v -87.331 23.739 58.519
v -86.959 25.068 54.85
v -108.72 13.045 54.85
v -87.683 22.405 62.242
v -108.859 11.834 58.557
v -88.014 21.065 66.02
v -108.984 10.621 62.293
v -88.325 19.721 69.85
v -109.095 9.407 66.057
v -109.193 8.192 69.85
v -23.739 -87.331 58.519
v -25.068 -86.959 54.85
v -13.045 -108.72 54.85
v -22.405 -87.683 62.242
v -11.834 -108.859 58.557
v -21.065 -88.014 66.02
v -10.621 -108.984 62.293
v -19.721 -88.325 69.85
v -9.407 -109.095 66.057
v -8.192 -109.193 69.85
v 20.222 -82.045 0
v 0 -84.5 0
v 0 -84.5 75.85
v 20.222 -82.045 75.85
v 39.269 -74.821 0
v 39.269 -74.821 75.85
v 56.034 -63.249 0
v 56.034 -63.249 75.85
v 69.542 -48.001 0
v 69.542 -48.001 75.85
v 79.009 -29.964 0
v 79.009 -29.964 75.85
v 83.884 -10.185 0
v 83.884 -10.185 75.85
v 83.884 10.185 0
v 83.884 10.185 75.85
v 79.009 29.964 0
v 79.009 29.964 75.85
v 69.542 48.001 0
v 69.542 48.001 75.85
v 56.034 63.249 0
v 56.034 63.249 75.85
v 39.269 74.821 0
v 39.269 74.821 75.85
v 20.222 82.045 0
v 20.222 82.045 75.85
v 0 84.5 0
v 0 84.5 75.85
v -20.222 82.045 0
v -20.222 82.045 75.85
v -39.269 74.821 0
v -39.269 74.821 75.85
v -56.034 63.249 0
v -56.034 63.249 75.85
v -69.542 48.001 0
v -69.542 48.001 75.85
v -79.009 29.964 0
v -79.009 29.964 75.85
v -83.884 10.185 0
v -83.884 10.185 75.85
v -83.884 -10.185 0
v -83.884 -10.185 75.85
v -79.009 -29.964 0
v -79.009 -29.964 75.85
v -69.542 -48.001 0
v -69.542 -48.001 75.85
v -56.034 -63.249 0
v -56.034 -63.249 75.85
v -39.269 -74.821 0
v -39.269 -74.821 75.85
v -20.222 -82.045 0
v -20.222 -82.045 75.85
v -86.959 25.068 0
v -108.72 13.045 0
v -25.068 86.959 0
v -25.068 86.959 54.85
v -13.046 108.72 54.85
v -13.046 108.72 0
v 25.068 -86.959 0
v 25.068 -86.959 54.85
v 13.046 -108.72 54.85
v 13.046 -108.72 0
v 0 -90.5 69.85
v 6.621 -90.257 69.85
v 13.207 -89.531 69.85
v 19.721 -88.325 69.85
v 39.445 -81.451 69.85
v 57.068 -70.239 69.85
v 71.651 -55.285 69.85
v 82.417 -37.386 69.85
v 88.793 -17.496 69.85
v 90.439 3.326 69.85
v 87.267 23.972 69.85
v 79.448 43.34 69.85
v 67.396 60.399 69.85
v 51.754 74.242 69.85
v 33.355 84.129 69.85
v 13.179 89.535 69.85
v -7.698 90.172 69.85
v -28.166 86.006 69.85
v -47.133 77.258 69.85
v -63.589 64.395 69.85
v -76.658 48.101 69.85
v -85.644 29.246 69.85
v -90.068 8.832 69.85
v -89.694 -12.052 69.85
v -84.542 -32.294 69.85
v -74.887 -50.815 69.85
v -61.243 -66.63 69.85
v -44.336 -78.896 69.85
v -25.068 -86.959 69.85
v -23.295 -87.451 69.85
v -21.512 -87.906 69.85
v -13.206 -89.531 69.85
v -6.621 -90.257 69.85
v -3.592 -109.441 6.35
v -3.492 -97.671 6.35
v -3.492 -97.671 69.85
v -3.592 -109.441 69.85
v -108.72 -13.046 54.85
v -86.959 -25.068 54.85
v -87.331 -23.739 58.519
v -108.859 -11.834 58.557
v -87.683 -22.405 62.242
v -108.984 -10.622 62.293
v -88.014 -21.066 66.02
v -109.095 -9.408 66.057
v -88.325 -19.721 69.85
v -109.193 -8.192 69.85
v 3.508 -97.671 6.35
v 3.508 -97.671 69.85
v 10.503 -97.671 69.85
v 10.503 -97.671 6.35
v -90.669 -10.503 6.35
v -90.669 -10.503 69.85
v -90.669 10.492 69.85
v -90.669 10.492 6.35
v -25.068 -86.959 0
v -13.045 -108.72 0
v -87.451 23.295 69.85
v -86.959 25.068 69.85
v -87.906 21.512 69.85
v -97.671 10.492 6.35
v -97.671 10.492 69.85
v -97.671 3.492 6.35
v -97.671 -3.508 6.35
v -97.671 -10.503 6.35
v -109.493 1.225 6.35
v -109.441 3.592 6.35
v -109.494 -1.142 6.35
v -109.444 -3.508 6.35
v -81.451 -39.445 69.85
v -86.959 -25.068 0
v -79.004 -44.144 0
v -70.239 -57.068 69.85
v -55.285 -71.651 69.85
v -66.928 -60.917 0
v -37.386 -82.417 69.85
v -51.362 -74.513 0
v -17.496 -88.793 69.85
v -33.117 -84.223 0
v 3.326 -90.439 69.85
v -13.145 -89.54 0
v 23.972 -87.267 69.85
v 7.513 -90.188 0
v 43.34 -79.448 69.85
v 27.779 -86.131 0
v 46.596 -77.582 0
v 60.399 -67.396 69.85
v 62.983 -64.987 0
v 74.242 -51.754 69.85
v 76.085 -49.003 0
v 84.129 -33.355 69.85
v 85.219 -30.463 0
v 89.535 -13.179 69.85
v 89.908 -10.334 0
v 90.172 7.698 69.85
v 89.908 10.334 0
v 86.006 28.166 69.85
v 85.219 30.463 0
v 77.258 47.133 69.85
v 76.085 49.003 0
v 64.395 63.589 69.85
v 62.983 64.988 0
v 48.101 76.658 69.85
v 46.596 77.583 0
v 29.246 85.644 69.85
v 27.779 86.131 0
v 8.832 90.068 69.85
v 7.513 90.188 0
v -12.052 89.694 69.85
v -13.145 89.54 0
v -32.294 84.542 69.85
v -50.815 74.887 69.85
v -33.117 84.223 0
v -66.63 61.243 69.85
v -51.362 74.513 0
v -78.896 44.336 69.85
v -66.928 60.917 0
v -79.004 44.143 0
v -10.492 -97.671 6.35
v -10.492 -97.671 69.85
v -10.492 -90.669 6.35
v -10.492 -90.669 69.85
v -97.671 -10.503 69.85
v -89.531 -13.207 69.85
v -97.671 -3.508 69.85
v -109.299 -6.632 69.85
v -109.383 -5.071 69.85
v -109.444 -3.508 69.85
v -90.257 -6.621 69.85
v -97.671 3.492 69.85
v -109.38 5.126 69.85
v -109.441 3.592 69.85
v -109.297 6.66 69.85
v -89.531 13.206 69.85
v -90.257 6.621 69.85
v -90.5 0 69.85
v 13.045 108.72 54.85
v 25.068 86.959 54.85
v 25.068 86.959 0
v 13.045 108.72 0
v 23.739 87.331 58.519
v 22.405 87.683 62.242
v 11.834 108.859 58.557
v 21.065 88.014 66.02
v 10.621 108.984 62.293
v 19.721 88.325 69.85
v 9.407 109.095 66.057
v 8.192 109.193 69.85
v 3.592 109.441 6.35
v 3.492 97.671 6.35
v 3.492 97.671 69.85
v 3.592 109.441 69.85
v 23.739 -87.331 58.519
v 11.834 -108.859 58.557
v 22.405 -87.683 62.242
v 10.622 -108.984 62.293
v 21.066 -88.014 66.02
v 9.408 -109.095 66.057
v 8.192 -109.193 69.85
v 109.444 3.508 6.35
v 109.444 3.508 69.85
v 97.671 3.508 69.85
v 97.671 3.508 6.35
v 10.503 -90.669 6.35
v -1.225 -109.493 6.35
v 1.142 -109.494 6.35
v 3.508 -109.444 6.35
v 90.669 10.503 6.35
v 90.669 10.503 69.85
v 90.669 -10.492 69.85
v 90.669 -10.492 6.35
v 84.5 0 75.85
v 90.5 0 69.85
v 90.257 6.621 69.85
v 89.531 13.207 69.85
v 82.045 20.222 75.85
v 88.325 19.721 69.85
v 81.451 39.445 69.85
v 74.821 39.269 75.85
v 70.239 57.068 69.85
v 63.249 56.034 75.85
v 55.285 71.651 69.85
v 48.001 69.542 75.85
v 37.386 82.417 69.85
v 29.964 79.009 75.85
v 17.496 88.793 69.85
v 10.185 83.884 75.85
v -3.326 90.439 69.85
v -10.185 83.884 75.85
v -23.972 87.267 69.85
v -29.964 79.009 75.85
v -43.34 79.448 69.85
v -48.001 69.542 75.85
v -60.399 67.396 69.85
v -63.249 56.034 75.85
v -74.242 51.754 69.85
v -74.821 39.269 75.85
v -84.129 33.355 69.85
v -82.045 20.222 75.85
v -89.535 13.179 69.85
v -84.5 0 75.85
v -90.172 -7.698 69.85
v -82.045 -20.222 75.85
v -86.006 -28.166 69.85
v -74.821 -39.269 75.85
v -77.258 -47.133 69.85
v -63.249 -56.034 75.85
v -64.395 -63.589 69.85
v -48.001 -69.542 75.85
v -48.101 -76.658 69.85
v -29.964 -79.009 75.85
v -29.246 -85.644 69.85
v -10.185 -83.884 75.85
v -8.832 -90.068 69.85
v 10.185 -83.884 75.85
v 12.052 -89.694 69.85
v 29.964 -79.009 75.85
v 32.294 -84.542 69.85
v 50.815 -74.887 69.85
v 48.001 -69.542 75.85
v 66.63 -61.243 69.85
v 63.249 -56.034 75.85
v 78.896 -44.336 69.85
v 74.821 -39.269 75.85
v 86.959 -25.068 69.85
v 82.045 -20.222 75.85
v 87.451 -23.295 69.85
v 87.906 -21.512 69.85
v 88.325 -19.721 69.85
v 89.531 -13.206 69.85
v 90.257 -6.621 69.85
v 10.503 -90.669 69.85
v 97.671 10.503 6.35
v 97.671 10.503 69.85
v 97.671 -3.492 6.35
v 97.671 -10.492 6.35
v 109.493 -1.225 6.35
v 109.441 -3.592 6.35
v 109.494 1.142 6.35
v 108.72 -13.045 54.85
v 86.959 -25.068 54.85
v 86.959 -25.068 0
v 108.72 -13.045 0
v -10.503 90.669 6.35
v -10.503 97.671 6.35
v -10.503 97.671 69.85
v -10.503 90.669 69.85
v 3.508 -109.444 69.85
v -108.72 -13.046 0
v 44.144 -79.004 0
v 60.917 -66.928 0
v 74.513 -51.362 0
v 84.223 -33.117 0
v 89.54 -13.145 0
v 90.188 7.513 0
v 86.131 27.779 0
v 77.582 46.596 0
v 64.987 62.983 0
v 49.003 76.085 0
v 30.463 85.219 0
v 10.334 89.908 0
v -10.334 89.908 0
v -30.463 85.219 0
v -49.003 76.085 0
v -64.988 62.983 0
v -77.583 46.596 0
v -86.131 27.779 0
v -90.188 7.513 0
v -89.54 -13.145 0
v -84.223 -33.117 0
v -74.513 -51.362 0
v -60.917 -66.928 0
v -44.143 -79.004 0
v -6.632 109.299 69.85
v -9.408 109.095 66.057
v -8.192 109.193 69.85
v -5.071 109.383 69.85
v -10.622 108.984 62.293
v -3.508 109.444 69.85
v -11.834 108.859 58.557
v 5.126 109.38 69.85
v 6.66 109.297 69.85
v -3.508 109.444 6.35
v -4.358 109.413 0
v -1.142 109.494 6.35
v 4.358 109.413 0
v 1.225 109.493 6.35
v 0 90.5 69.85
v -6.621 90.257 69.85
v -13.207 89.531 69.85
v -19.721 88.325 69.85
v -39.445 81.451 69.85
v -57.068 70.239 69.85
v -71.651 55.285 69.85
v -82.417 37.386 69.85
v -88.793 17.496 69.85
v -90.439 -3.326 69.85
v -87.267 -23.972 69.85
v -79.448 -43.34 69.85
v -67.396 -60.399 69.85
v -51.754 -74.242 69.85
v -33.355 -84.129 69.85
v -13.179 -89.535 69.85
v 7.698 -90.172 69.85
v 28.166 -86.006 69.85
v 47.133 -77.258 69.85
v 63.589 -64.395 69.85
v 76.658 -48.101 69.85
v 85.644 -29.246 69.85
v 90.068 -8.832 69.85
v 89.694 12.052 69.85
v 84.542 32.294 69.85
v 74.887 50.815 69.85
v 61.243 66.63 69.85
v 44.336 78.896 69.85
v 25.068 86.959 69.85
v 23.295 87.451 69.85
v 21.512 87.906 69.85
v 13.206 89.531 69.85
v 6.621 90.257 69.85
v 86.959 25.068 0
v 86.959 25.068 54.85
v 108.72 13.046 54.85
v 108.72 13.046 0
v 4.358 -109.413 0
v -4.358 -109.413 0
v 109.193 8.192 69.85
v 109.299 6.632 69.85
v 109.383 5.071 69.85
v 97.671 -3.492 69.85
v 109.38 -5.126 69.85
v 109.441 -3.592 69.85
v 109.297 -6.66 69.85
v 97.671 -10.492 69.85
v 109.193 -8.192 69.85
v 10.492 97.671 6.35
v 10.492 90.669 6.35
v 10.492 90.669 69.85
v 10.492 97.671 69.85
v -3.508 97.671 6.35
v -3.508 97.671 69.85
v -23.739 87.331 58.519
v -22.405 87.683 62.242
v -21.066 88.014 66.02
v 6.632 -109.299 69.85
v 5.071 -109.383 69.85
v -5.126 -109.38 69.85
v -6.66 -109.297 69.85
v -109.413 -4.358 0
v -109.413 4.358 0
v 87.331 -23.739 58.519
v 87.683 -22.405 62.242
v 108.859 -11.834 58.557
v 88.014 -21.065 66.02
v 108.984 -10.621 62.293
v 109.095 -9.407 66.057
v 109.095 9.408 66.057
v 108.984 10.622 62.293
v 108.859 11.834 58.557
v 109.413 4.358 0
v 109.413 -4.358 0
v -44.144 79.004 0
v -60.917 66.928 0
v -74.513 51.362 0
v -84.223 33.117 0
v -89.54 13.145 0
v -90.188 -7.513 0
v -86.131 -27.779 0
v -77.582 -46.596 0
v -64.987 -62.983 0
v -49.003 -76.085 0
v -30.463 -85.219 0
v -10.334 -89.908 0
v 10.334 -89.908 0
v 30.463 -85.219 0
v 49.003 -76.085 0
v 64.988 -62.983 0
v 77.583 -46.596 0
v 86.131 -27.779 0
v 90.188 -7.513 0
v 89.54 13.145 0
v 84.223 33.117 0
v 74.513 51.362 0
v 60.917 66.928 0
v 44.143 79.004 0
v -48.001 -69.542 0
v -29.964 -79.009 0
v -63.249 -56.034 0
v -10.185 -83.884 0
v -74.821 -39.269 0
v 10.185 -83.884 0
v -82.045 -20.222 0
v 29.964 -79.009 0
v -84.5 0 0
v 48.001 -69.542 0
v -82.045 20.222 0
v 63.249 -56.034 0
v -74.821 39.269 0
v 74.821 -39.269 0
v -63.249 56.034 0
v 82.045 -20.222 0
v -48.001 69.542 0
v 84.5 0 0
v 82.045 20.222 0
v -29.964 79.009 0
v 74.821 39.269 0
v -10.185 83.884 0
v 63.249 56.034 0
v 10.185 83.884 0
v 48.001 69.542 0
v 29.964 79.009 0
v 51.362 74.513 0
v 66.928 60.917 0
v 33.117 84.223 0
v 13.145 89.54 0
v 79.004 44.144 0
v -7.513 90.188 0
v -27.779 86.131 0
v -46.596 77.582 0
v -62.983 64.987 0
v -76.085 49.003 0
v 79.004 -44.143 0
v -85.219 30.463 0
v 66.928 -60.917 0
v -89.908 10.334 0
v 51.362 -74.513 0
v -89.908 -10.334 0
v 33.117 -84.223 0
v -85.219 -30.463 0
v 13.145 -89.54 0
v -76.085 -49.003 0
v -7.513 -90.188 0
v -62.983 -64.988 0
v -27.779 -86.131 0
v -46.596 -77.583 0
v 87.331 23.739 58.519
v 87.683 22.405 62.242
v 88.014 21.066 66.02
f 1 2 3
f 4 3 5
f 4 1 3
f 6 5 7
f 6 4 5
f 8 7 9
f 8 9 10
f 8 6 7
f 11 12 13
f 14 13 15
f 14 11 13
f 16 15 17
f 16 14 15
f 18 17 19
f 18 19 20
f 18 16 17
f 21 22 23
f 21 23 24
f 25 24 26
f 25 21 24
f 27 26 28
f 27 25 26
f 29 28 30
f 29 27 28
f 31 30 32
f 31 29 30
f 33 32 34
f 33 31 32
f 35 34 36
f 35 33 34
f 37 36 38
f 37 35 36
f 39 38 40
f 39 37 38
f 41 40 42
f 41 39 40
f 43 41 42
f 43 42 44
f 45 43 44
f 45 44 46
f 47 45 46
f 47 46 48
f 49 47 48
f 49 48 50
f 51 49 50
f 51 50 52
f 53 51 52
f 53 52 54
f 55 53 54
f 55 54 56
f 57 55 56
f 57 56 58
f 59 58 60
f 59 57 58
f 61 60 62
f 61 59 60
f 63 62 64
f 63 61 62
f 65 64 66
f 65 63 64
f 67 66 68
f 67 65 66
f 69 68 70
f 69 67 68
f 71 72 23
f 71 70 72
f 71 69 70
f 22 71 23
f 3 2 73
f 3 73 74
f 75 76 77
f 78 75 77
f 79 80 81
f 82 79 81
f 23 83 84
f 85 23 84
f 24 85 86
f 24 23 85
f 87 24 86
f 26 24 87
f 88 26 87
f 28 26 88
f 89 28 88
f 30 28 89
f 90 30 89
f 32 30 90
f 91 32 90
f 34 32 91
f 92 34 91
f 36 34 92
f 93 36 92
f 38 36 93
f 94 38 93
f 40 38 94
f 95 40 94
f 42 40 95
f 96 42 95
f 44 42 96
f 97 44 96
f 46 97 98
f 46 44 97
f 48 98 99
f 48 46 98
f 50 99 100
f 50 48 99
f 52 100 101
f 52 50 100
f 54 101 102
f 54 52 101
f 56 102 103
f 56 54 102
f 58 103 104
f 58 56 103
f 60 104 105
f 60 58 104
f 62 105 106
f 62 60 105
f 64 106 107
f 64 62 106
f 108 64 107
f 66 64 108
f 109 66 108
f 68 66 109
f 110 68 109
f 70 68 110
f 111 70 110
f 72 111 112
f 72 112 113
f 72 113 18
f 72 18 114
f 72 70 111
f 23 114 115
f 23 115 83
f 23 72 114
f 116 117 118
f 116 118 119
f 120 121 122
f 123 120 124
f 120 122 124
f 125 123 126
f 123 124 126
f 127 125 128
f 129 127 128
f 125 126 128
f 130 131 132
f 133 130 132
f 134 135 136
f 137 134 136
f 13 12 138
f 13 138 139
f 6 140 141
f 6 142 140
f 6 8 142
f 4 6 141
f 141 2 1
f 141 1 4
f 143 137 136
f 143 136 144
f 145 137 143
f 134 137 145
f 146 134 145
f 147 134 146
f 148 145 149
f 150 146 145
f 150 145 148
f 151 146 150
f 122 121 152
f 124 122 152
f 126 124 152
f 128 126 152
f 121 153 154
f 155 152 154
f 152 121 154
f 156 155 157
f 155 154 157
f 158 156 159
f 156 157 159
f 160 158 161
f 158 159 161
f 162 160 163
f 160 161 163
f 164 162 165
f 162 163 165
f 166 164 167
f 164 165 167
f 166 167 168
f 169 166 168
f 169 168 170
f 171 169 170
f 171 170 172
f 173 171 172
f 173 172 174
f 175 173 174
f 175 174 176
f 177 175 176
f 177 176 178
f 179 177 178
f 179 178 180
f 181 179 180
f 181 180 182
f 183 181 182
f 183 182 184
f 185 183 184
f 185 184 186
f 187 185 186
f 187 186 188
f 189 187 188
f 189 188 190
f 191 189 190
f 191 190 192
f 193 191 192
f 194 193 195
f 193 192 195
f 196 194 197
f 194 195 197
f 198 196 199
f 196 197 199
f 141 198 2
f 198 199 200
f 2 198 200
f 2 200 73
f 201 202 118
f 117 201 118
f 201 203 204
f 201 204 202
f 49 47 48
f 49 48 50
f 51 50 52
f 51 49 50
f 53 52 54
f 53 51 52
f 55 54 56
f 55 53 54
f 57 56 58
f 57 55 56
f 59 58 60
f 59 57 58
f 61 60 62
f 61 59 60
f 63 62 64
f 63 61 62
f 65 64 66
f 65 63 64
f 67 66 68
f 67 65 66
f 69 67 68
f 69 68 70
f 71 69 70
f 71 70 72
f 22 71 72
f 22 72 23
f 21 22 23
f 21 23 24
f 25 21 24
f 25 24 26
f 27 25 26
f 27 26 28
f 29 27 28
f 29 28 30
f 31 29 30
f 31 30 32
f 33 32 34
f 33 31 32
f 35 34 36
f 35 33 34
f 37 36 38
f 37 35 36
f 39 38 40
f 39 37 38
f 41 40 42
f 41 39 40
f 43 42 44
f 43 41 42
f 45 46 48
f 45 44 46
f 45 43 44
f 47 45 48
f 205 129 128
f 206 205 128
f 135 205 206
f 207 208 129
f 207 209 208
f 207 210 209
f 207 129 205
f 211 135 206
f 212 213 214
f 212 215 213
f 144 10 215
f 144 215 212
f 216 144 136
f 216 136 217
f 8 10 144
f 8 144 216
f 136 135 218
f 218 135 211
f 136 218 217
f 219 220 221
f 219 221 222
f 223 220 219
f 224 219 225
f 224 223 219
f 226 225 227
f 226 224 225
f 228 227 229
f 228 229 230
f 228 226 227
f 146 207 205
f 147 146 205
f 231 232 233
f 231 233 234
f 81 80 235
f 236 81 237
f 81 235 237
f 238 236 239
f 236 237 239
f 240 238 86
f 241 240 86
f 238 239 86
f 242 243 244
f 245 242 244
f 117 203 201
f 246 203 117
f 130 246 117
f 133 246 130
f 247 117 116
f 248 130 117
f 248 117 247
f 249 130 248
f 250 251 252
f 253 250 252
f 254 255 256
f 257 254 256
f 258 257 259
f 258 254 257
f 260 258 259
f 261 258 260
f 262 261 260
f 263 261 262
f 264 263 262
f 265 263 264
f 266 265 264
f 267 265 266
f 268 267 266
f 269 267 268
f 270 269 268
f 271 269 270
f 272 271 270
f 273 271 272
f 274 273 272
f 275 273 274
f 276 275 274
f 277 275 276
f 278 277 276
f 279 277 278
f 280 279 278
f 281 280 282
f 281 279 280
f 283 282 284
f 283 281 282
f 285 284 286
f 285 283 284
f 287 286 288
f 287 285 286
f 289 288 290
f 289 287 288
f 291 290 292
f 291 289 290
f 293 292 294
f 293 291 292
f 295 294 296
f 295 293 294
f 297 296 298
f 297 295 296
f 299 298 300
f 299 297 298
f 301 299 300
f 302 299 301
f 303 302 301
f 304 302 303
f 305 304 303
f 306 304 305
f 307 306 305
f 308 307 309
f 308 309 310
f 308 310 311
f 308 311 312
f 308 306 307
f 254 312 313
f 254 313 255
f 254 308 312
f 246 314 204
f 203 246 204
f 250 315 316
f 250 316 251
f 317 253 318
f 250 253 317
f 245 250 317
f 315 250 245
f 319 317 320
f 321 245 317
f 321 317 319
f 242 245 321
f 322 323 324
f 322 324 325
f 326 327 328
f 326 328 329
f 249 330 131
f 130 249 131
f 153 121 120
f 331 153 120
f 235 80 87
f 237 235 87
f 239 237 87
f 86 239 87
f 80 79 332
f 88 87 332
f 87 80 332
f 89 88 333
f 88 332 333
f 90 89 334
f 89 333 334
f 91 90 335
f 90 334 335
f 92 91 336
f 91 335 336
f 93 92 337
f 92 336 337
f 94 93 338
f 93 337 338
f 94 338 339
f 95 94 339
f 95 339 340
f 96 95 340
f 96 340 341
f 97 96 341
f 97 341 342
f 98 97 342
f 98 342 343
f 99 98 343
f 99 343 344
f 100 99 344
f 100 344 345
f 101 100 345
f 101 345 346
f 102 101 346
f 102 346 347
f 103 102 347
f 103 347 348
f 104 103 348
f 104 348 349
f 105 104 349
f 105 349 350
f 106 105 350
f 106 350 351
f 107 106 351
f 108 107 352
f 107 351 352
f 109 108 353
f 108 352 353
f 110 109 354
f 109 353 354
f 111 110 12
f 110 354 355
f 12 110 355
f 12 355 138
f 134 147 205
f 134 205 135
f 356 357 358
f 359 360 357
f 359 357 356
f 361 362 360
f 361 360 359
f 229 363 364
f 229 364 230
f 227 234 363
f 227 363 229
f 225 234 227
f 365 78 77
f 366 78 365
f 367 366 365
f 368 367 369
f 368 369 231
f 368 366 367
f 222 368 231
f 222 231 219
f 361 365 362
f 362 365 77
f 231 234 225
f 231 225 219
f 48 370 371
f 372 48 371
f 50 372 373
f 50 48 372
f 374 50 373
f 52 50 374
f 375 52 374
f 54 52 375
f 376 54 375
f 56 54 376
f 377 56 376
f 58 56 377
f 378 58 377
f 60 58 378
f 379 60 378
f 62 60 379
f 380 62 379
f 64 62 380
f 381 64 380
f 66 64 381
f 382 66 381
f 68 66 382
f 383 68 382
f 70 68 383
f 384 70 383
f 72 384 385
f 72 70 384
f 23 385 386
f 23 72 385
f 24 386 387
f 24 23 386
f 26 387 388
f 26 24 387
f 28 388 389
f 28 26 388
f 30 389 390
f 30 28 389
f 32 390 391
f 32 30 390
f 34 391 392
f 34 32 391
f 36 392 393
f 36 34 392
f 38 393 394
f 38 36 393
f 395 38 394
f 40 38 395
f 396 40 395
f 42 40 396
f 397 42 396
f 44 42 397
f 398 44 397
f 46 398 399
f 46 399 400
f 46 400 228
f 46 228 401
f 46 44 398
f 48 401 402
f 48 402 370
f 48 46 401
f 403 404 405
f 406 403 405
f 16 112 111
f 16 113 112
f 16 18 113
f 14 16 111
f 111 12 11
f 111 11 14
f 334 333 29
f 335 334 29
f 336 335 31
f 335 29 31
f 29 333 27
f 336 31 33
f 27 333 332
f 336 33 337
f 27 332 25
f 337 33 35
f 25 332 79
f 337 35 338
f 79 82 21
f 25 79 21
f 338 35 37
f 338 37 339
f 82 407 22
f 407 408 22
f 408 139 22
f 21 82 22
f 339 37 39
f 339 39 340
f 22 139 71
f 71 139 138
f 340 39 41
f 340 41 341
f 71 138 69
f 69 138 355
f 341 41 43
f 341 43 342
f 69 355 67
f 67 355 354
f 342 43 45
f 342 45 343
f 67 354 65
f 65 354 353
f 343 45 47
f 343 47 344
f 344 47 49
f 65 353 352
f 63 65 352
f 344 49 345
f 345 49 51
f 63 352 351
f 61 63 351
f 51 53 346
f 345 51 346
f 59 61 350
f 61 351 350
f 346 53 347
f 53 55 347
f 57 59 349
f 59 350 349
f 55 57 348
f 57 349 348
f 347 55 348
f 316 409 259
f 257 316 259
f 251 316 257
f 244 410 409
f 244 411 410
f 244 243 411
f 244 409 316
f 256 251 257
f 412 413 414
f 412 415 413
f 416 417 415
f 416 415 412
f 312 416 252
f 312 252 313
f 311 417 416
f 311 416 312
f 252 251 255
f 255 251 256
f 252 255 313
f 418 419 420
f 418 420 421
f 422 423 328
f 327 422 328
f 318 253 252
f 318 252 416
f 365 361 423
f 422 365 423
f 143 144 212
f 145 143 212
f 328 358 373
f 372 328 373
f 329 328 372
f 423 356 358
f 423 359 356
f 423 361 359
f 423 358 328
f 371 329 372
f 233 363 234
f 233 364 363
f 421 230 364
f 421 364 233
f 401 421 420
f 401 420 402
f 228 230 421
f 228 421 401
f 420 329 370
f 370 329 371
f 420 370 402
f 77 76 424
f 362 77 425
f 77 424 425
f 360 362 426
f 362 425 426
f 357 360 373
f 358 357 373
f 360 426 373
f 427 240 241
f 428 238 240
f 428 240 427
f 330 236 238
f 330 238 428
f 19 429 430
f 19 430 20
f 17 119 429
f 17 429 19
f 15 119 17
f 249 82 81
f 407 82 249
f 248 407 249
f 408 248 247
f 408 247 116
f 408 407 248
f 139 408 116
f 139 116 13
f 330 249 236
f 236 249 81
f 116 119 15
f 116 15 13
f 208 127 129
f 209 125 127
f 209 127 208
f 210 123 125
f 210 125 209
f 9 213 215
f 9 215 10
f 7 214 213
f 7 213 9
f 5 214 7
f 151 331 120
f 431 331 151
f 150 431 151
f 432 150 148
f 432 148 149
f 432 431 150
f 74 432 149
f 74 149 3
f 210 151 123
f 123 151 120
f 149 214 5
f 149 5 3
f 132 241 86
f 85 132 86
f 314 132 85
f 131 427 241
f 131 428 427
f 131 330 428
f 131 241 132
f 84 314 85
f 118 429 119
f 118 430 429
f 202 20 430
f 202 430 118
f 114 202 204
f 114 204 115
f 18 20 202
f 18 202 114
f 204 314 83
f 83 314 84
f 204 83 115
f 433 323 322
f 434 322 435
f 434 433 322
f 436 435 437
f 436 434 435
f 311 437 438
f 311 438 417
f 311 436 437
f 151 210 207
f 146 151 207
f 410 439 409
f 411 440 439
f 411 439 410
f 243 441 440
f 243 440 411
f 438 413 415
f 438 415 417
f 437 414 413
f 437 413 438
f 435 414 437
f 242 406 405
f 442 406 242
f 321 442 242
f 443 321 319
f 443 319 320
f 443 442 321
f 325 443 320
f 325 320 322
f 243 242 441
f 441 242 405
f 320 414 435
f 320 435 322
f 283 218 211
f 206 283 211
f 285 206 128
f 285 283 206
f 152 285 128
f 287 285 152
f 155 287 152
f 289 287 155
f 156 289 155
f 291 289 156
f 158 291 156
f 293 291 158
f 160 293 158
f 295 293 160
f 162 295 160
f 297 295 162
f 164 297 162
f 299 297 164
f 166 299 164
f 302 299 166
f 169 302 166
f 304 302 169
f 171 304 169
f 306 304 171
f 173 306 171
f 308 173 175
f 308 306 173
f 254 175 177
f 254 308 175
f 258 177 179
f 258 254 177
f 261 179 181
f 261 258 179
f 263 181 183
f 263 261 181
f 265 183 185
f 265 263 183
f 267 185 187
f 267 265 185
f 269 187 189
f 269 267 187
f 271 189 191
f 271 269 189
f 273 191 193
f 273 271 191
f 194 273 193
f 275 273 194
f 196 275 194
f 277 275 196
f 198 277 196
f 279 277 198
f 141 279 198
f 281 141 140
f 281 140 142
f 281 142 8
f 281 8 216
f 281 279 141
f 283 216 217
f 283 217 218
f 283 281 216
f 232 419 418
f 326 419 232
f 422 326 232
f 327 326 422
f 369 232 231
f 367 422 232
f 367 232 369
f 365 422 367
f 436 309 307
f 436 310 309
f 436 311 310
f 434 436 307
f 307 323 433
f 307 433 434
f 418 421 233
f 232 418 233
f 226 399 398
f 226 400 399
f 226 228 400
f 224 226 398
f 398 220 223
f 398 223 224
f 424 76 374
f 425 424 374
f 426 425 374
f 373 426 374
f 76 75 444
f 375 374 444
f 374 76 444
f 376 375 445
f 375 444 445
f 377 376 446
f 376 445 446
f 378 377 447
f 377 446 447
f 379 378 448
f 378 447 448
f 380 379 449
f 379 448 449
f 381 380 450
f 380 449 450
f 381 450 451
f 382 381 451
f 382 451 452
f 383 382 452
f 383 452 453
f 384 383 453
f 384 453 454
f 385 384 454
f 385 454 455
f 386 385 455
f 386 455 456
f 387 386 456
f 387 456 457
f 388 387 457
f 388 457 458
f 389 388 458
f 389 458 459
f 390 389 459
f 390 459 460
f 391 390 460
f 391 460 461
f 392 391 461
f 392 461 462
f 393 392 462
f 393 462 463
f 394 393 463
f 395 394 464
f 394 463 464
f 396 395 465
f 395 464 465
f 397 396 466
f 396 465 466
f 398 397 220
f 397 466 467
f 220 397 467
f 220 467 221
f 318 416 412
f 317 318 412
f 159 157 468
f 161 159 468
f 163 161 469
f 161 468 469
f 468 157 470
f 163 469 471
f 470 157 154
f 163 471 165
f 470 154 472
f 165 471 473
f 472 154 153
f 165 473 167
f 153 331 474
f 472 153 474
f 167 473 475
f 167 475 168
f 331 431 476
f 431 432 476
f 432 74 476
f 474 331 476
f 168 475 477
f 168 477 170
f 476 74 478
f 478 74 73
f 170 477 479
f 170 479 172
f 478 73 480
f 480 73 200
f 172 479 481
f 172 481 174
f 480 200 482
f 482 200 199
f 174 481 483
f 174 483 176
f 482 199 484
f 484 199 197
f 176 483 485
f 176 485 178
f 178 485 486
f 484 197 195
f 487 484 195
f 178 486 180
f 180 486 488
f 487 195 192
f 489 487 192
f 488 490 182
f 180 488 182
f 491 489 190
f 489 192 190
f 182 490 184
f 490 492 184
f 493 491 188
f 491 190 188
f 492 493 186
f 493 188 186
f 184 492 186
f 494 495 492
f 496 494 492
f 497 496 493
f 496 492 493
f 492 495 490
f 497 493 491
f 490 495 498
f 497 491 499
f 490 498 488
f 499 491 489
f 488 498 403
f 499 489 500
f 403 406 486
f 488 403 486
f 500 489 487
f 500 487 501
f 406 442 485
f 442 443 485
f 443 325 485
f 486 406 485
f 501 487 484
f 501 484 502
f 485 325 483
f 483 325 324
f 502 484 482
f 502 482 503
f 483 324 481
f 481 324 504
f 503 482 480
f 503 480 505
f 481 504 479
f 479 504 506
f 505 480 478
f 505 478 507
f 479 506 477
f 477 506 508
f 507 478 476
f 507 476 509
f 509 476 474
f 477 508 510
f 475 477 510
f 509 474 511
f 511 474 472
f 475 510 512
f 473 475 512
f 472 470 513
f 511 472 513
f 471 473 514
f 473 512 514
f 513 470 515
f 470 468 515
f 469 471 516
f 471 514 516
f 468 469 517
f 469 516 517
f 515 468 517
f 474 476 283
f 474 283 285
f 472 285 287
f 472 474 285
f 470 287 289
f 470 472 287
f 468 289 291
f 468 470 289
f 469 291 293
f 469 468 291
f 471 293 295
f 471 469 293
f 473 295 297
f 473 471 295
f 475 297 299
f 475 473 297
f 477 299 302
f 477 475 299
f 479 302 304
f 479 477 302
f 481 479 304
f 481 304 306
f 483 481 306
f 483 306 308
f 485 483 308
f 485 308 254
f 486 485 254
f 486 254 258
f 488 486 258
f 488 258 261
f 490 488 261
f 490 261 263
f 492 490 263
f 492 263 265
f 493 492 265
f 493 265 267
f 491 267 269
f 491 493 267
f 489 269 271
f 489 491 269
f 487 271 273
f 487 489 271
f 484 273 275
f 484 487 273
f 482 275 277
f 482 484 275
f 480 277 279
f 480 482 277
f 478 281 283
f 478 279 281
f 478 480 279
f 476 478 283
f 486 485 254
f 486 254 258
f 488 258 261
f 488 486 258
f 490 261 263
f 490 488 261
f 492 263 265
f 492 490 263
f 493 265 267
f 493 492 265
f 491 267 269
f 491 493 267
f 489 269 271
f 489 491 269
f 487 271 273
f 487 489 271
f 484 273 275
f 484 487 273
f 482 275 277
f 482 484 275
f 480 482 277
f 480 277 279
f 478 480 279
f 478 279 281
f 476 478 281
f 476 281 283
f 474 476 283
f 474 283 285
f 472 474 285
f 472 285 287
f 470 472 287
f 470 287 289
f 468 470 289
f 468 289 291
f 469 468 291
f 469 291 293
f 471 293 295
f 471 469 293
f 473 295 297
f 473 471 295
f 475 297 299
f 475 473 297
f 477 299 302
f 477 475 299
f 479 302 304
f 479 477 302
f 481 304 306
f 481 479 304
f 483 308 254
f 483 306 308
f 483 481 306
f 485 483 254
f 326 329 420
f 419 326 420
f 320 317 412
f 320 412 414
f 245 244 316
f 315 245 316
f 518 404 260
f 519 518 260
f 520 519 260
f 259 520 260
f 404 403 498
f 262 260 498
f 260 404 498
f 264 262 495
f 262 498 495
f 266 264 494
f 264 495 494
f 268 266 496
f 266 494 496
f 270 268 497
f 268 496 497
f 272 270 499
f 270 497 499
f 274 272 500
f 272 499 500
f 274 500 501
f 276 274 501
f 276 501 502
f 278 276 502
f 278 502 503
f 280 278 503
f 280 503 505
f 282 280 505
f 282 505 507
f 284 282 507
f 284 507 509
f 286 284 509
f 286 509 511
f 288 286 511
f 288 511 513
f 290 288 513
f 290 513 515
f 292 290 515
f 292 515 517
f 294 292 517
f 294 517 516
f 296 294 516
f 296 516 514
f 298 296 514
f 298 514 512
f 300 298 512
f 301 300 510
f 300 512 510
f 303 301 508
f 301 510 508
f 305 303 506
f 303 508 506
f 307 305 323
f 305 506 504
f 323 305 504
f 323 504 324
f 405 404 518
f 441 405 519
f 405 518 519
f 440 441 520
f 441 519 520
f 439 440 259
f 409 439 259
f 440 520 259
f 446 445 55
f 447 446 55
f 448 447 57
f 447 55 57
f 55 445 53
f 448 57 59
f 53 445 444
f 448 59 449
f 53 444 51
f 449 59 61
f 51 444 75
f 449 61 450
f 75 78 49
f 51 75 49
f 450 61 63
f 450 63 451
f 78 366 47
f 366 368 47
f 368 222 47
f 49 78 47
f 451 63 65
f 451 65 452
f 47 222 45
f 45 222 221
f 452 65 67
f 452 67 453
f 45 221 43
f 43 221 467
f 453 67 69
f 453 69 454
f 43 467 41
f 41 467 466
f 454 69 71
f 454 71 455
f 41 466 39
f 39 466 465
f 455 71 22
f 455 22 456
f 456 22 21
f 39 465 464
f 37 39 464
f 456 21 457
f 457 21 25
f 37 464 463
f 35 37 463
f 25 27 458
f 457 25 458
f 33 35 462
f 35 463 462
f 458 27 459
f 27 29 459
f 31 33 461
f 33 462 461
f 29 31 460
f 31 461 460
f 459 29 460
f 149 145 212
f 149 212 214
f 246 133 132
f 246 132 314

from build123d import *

# Parameters (mm, degrees)
SKETCH1_R           = 90.5
SKETCH1_R_2         = 84.5
BOSS_EXTRUDE1_DEPTH = 76.35
CHAMFER1_SIZE       = 6.5
WRAP12_SECTION_W    = 19
WRAP12_SECTION_H    = 69.85
WRAP12_ANGLE        = 32.161608832
CUT_EXTRUDE1_DEPTH  = 63.5
CHAMFER2_SIZE       = 19
CHAMFER5_SIZE       = 15
CHAMFER5_SIZE_2     = 4.019237886
CIRPATTERN6_COUNT   = 4


with BuildPart() as part:
    # Sketch1 → Boss-Extrude1 (new body)
    with BuildSketch(Plane.XY):
        Circle(SKETCH1_R)
        Circle(SKETCH1_R_2, mode=Mode.SUBTRACT)
    extrude(amount=BOSS_EXTRUDE1_DEPTH)

    # Chamfer1
    # the kernel refuses this chamfer: 6.5 mm, written as the material it takes off along each edge
    with BuildSketch(Plane(origin=(0, 0, 76.35), x_dir=(1, 0, 0), z_dir=(0, -1, 0))) as chamfer1_piece_1:
        Polygon((90.5, -CHAMFER1_SIZE), (90.5 - CHAMFER1_SIZE, 0), (90.5, 0), align=None)
    revolve(axis=Axis((0, 0, 76.35), (0, 0, 1)), mode=Mode.SUBTRACT)

    # Wrap12 section (on wrap section) → Wrap12 (revolve)
    with BuildSketch(Plane(origin=(0, 0, 0), x_dir=(0.9608717281441653, 0.276993722046629, 0), z_dir=(-0.276993722046629, 0.9608717281441653, 0))):
        with Locations((100, -34.925)):
            Rectangle(WRAP12_SECTION_W, WRAP12_SECTION_H)
    revolve(axis=Axis((0, 0, 0), (0, 0, -1)), revolution_arc=WRAP12_ANGLE)

    # Sketch12 → Cut-Extrude1 (cut)
    with BuildSketch(Plane.XY.offset(69.85)):
        Polygon((122.706651928, -0.201195148), (122.706651928, 3.507927311), (97.67138598, 3.507927311), (97.67138598, 10.503148948), (90.66864355, 10.503148948), (90.66864355, -10.492123054), (97.67138598, -10.492123054), (97.67138598, -3.492123054), (122.706651928, -3.70406248), align=None)
    extrude(amount=-CUT_EXTRUDE1_DEPTH, mode=Mode.SUBTRACT)

    # Chamfer2
    # the kernel refuses this chamfer: 19 mm, written as the material it takes off along each edge
    with BuildSketch(Plane(origin=(105.215515497, -30.330600038, 118.711976771), x_dir=(-0.9608722876451651, 0.27699178116967144, 0), z_dir=(0, 0, -1))) as chamfer2_piece_1_section:
        with BuildLine():
            Line((CHAMFER2_SIZE, 0), (1.420369251, 17.579630749))
            ThreePointArc((1.420369251, 17.579630749), (0.375784571, 9.063973019), (0, 0))
            Line((0, 0), (CHAMFER2_SIZE, 0))
        make_face()
    chamfer2_piece_1 = extrude(amount=167.573953543, mode=Mode.PRIVATE)
    chamfer2_piece_1 = chamfer2_piece_1 - Plane(origin=(0, 0, 118.711976771), x_dir=(1, 0, 0), z_dir=(0, 0, -1)) * Cylinder(90.5, 412, mode=Mode.PRIVATE)
    add(chamfer2_piece_1, mode=Mode.SUBTRACT)
    with BuildSketch(Plane(origin=(105.215454232, 30.330812564, 118.711976771), x_dir=(-0.9608717281441654, -0.2769937220466291, 0), z_dir=(0, 0, -1))) as chamfer2_piece_2_section:
        with BuildLine():
            Line((CHAMFER2_SIZE, 0), (1.420369251, -17.579630749))
            ThreePointArc((1.420369251, -17.579630749), (0.375784571, -9.063973019), (0, 0))
            Line((0, 0), (CHAMFER2_SIZE, 0))
        make_face()
    chamfer2_piece_2 = extrude(amount=167.573953543, mode=Mode.PRIVATE)
    chamfer2_piece_2 = chamfer2_piece_2 - Plane(origin=(0, 0, 118.711976771), x_dir=(1, 0, 0), z_dir=(0, 0, -1)) * Cylinder(90.5, 412, mode=Mode.PRIVATE)
    add(chamfer2_piece_2, mode=Mode.SUBTRACT)

    # Chamfer5
    # the kernel refuses this chamfer: 15, 4.019237886 mm, written as the material it takes off along each edge
    with BuildSketch(Plane(origin=(52.865116584, 43.903567605, 69.85), x_dir=(0, 0, -1), z_dir=(0.8753030540266438, -0.483574775615551, 0))) as chamfer5_piece_1_section:
        Polygon((CHAMFER5_SIZE, 0), (0, -CHAMFER5_SIZE_2), (0, 0), align=None)
    chamfer5_piece_1 = extrude(amount=102.762999332, mode=Mode.PRIVATE)
    chamfer5_piece_1 = chamfer5_piece_1 - Plane(origin=(0, 0, 69.85), x_dir=(1, 0, 0), z_dir=(0, 0, -1)) * Cylinder(90.5, 266, mode=Mode.PRIVATE)
    add(chamfer5_piece_1, mode=Mode.SUBTRACT)
    with BuildSketch(Plane(origin=(52.865205265, -43.903460822, 69.85), x_dir=(0, 0, -1), z_dir=(0.8753020772463168, 0.48357654364979585, 0))) as chamfer5_piece_2_section:
        Polygon((CHAMFER5_SIZE, 0), (0, CHAMFER5_SIZE_2), (0, 0), align=None)
    chamfer5_piece_2 = extrude(amount=102.762999332, mode=Mode.PRIVATE)
    chamfer5_piece_2 = chamfer5_piece_2 - Plane(origin=(0, 0, 69.85), x_dir=(1, 0, 0), z_dir=(0, 0, -1)) * Cylinder(90.5, 266, mode=Mode.PRIVATE)
    add(chamfer5_piece_2, mode=Mode.SUBTRACT)


with BuildPart() as cirpattern6_1:
    # CirPattern6: pattern copy
    add(part.part.rotate(Axis((0, 0, 0), (0, 0, 1)), 1 * 360 / CIRPATTERN6_COUNT))


with BuildPart() as cirpattern6_2:
    # CirPattern6: pattern copy
    add(part.part.rotate(Axis((0, 0, 0), (0, 0, 1)), 2 * 360 / CIRPATTERN6_COUNT))


with BuildPart() as cirpattern6_3:
    # CirPattern6: pattern copy
    add(part.part.rotate(Axis((0, 0, 0), (0, 0, 1)), 3 * 360 / CIRPATTERN6_COUNT))


solid = Compound([part.part, cirpattern6_1.part, cirpattern6_2.part, cirpattern6_3.part])
